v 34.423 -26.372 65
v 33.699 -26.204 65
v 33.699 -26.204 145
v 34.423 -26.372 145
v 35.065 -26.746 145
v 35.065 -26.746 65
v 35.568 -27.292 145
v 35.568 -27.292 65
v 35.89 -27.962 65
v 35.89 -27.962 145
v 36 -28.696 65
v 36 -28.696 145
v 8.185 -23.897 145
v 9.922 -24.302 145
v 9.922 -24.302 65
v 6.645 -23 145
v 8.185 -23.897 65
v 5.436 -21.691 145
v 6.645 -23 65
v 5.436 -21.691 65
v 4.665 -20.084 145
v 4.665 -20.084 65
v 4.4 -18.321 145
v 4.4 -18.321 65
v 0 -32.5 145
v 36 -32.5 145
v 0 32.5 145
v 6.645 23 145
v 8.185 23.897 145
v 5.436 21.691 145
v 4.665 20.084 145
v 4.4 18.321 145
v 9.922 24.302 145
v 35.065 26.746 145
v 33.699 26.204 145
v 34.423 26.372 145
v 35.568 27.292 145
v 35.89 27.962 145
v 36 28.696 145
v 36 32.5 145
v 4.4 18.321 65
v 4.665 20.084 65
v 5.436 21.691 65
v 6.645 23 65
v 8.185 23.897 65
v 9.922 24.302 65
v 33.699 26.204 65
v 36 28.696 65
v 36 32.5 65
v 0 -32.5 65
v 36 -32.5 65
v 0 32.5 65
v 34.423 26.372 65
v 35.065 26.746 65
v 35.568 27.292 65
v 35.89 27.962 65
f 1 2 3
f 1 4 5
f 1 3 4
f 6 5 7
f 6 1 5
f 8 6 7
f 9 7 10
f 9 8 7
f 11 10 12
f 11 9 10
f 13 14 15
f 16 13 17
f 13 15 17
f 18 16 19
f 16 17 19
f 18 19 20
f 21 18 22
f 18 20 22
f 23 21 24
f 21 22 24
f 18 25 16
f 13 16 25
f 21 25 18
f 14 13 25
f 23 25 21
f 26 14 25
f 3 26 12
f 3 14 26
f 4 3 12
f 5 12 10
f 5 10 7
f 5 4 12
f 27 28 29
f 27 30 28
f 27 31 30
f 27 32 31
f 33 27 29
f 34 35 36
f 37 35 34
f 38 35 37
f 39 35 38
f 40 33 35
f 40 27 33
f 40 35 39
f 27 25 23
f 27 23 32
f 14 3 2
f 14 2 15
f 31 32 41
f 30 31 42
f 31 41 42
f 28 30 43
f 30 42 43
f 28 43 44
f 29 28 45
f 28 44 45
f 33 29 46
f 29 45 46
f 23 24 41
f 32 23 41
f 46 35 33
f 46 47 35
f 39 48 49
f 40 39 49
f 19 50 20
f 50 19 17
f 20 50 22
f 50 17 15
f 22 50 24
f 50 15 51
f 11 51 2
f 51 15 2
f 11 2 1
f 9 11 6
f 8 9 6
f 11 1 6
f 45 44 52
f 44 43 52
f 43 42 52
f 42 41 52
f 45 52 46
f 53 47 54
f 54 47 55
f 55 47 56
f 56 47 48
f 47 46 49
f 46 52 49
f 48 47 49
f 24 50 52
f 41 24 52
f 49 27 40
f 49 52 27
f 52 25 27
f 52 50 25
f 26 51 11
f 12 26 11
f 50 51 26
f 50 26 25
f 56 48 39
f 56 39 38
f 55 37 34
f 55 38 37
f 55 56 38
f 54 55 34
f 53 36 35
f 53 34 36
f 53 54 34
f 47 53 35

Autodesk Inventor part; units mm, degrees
ref_plane "Начальная плоскость" through (0, 0, 65) normal (0, 0, 1) x (1, 0, 0)
ref_plane "Конечная плоскость" through (0, 0, 145) normal (0, 0, 1) x (1, 0, 0)
sketch "Эскиз" plane through (0, 0, 0) normal (0, 0, 1) x (1, 0, 0)
  line L0 (36, -32.5) -> (0, -32.5)
  line L1 (36, -32.5) -> (36, -28.696)
  line L2 (33.6994, -26.2039) -> (9.9215, -24.3017)
  line L3 (4.4, -18.3208) -> (4.4, 18.3208)
  line L4 (33.6994, 26.2039) -> (9.9215, 24.3017)
  line L5 (36, 28.696) -> (36, 32.5)
  line L6 (0, 32.5) -> (36, 32.5)
  line L7 (0, -32.5) -> (0, 32.5)
  arc A0 (4.4, -18.3208) -> (9.9215, -24.3017) centre (10.4, -18.3208) ccw
  arc A1 (9.9215, 24.3017) -> (4.4, 18.3208) centre (10.4, 18.3208) ccw
  arc A2 (36, -28.696) -> (33.6994, -26.2039) centre (33.5, -28.696) ccw
  arc A3 (33.6994, 26.2039) -> (36, 28.696) centre (33.5, 28.696) ccw
  line L8 (0, 45.5) -> (0, -45.5) construction
  line L9 (-7.2974, 0) -> (43.7847, 0) construction
  point P0 (36, -26.388)
  point P1 (4.4, -23.86)
  point P2 (4.4, 23.86)
  point P3 (36, 26.388)
  dimension "d3" = 36
  dimension "d5" = 4.4
  dimension "d7" = 65
  dimension "d9" = 8.64
  dimension "d11" = 8.64
  dimension "d13" = 6.112
  dimension "d15" = 6.112
  dimension "d22" = 6
  dimension "d23" = 2.5
  dimension "d24" = 32.5
  dimension "d25" = 0
extrude "Тело" add sketch "Эскиз" along normal up to surface (80 mm away) from surface at 65
sketch "Sketch3" plane through (0, 0, 0) normal (0, 0, 1) x (1, 0, 0)
  line L0 (0, 0) -> (10, 0)
ref_plane "Work Plane7" through (0, 0, 0) normal (0, -1, 0) x (1, 0, 0)
sketch "Sketch4" plane through (0, 0, 0) normal (0, -1, 0) x (1, 0, 0)
  line L0 (-2, 65) -> (12, 65)
  line L1 (-2, 145) -> (12, 145)
  dimension "d29" = 80
ref_plane "РабПлоскость8" through (18, 0, 145) normal (0, 0, 1) x (1, 0, 0)
split "Разделение1" plane through (18, 0, 145) removes the side toward (0, 0, 1)
ref_plane "РабПлоскость9" through (18, 0, 145) normal (0, 0, 1) x (1, 0, 0)
split "Разделение2" plane through (18, 0, 145) removes the side toward (0, 0, 1)
ref_plane "РабПлоскость10" through (18, 0, 65) normal (0, 0, -1) x (-1, 0, 0)
split "Разделение3" plane through (18, 0, 65) removes the side toward (0, 0, -1)
equation "\"d3\" = b"
equation "\"d5\" = t1"
equation "\"d7\" = ParH"
equation "\"d9\" = msp_x1 + t2"
equation "\"d11\" = msp_x1 + t2"
equation "\"d13\" = -msp_x2 + t2"
equation "\"d15\" = -msp_x2 + t2"
equation "\"d22\" = R"
equation "\"d23\" = R1"
equation "\"d24\" = 0.5 * d7"
equation "\"d16\" = G_L"
equation "\"R1\" = 2.5"
equation "\"R\" = 6"
equation "\"t1\" = 4.4"
equation "\"t2\" = 7.2"
equation "\"ParH\" = 65"
equation "\"b\" = 36"
equation "\"msp_x1\" = 0.04 * b"
equation "\"msp_x2\" = -0.08 * t1 + 0.04 * b"
equation "\"G_L\" = d29"
equation "\"ex\" = 0"
equation "\"G_OFFSET_START\" = -65"
equation "\"G_OFFSET_END\" = -65"
equation "\"d26\" = -G_OFFSET_START"
equation "\"d27\" = G_OFFSET_END + B_L"
equation "\"B_L\" = 210"
properties part number "Швеллер 6.5U-80 ГОСТ 8240-97"
